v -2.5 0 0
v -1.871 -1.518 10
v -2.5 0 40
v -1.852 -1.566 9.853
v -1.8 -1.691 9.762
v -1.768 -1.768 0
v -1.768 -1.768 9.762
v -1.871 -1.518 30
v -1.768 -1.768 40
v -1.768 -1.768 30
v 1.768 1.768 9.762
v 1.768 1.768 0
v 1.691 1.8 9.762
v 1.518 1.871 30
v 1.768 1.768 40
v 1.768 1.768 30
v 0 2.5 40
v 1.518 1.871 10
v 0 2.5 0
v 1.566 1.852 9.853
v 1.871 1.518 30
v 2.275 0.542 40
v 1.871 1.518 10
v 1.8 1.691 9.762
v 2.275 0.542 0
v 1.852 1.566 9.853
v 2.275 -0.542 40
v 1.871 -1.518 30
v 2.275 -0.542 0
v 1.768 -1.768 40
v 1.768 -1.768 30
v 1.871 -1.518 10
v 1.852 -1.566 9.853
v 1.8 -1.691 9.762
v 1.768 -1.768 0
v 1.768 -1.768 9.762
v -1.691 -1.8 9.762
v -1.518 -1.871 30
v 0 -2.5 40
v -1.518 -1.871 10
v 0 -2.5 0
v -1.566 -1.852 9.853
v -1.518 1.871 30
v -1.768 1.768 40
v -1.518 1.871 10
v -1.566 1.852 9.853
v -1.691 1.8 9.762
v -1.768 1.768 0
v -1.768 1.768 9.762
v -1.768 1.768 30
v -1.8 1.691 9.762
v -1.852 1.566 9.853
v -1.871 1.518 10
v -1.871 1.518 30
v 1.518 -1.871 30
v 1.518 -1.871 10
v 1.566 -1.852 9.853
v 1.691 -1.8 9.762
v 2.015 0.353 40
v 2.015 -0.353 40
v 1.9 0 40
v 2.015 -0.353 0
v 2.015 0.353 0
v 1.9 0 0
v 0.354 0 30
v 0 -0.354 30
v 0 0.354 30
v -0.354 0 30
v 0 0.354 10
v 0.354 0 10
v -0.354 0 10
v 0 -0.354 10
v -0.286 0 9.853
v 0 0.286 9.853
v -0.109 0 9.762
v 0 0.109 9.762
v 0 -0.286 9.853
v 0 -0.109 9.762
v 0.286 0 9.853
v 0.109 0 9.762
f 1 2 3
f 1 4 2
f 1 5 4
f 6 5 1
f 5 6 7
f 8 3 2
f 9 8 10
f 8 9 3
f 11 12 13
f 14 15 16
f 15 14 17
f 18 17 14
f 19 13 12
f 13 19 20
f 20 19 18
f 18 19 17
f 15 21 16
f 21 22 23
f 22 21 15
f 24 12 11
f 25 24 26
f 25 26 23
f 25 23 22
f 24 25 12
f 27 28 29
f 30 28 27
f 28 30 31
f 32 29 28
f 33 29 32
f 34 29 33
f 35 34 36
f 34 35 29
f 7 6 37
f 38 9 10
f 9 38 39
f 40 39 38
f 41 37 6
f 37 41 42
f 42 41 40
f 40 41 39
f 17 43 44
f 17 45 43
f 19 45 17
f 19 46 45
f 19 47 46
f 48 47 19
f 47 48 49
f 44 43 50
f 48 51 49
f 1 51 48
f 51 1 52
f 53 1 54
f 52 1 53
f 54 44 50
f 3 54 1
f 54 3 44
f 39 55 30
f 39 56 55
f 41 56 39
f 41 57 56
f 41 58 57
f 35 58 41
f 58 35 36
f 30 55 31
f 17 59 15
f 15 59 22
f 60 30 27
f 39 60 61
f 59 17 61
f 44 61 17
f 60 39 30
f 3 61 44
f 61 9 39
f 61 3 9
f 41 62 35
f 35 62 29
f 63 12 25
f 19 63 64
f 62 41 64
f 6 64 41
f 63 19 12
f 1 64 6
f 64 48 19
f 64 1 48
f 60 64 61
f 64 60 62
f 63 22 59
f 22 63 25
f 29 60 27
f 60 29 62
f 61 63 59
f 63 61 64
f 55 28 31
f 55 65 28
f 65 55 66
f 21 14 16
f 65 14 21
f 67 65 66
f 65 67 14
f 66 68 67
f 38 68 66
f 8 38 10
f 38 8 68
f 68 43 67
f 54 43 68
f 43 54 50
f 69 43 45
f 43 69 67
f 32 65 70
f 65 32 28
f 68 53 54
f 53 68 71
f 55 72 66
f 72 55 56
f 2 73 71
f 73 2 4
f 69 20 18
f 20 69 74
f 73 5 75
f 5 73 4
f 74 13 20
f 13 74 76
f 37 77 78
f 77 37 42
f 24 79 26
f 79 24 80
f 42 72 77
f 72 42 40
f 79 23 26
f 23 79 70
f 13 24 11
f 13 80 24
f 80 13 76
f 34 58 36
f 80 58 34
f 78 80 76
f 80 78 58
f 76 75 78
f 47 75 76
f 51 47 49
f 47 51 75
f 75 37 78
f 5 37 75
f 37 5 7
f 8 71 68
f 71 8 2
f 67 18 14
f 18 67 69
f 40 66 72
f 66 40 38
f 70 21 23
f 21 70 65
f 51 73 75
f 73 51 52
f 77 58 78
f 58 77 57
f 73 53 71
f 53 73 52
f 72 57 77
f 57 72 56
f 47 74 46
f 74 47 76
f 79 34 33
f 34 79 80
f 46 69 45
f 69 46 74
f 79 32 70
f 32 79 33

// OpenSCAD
// file: cylinder_with_notch.scad
//
// Makes a cylinder with a notch.
// Params:
//   radio -- Radio of the cylinder.
//   height -- Height of the cylinder.
//   notch_radio -- Radio of the notch.
//   center -- [true, false] Center the cylinder in origin [0,0,0].
//
module cylinder_with_notch(
    radio = 10, height = 30, notch_radio = 2, center=false, $fn=$fn)
{
  
  difference() 
  {
    // Main cylinder.
    cylinder(r=radio, h=height, center=center);
    // Lets subtract notch.
    translate([radio, 0, 0])
      cylinder(r=notch_radio, h=height+10, center=center, $fn=$fn+10);
  }
} 

// Cylinder with notch.
cylinder_with_notch(radio=10, height=30, notch_radio=2, center=true);
// main file
use <cylinder_with_notch.scad>

module link(radio = 10, height = 30, notch_radio = 2,
            slot_width=0.5, slot_height=10) 
{
  
  difference() 
  {
    cylinder_with_notch(radio, height, notch_radio);
    for (i = [-1, 1])
      for (j = [-1, 1]) 
      {
        // Subtract cube to make slot. 
        translate([0,0,i*(-height/2-(slot_height+10)/2+slot_height)])
          rotate([0, 0, j*45])
            cube([2*radio+10, slot_width, slot_height+10], center=true);
        // Subtract cylinder to let slot end in semi-circle.
        translate([0, 0, i*(-height/2+slot_height)])
          rotate([90, 0, j*45])
            cylinder(r=slot_width/2,h=2*radio+10,center=true, $fn=10);
      }
  }
} 

// link's radio.
RADIO = 2.5;

// link's height.
HEIGHT = 40;

// link's notch radio.
NOTCH_RADIO = 0.6;

// Link's slot width.
SLOT_WIDTH = 0.5;

// Link's slot height.
SLOT_HEIGHT = 10;

// Show debug info on output console and draw auxiliary geometry to check.
DEBUG=true;

if (DEBUG) 
{
  echo ("Radio=", RADIO);
  echo ("Height=", HEIGHT);
  echo ("Notch radio=", NOTCH_RADIO);
}

link(radio=RADIO, height=HEIGHT, notch_radio=NOTCH_RADIO,
     slot_width=SLOT_WIDTH, slot_height=SLOT_HEIGHT);
